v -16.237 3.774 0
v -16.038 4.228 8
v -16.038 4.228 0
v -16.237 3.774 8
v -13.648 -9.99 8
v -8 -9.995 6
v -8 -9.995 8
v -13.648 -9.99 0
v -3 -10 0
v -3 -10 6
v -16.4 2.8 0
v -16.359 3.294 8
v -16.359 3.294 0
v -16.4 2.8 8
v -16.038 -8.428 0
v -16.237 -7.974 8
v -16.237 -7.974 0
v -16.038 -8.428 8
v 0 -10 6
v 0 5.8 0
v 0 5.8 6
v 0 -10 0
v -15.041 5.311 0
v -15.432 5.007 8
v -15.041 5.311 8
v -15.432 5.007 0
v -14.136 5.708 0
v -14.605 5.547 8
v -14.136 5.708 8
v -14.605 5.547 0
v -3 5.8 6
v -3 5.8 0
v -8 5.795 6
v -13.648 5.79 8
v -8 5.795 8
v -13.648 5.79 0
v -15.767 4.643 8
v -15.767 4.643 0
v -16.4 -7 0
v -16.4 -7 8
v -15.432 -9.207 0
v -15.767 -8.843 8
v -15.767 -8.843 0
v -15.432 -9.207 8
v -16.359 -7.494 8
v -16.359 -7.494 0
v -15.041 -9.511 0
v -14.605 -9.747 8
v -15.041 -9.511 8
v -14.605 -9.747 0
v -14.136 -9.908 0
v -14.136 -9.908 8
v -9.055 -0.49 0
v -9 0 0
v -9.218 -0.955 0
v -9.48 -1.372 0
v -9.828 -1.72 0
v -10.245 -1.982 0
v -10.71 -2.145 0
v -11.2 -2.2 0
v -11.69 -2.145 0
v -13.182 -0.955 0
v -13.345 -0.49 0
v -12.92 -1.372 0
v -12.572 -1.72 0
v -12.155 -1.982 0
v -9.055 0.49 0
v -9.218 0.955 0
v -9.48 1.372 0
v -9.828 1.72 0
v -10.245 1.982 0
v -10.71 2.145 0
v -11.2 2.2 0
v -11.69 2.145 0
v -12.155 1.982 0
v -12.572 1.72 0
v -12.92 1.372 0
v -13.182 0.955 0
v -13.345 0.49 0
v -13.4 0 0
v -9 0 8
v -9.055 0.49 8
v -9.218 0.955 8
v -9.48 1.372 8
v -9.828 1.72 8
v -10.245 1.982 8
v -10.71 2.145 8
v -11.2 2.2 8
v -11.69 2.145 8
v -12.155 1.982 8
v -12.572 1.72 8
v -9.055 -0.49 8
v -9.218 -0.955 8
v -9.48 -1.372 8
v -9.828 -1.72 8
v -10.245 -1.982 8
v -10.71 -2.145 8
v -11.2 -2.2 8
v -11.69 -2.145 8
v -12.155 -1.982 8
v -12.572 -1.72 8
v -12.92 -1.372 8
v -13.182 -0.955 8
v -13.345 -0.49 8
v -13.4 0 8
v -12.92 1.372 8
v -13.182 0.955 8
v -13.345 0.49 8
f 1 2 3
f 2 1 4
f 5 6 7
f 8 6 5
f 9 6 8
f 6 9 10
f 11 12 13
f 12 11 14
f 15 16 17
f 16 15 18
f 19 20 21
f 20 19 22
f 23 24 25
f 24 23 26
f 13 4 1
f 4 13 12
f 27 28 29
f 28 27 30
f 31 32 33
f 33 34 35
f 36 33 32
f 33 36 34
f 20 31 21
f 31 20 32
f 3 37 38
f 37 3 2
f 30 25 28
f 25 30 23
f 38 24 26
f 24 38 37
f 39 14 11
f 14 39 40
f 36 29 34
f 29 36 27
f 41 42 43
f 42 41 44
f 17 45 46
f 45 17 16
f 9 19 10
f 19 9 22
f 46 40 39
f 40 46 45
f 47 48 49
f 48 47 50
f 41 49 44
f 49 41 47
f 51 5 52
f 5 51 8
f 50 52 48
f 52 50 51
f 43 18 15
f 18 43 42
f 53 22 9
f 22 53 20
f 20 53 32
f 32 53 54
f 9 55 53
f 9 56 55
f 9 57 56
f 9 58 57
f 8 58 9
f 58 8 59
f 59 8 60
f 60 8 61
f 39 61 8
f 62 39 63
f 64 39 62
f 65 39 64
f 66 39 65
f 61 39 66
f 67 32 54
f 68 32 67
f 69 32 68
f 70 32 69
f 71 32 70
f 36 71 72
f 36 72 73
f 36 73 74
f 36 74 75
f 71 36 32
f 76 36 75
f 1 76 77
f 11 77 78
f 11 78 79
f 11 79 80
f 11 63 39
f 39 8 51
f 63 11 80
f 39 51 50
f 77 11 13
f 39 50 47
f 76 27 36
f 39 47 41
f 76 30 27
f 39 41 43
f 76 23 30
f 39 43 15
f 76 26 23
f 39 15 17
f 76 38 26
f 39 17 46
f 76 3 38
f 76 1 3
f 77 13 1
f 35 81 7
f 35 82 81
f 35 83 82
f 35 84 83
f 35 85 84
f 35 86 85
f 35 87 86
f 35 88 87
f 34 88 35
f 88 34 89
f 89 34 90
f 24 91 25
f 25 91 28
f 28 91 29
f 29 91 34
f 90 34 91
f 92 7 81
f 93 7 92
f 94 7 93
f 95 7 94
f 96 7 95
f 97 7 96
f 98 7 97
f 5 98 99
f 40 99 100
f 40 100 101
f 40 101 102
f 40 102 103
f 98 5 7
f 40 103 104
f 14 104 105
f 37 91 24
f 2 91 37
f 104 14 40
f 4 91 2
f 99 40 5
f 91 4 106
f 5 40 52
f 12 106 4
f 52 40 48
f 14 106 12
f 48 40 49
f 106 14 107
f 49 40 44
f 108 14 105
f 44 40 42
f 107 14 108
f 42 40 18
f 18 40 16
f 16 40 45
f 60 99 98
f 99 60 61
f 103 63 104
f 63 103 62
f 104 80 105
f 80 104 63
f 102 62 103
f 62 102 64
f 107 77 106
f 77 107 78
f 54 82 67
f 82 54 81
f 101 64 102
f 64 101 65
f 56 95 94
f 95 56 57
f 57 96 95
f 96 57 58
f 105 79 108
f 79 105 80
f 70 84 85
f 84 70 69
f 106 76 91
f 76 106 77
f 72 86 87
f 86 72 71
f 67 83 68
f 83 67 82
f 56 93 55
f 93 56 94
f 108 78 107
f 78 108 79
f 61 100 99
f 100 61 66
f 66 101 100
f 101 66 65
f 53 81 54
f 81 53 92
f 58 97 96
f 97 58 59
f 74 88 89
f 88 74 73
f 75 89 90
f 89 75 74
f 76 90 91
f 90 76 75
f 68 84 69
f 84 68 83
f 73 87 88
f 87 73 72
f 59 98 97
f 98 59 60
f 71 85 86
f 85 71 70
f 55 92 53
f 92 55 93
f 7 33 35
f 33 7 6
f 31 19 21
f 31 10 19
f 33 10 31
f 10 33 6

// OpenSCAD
// file: functions.scad
/*******************************************************************

This OpenSCAD code and its rendered 3D model are part of the

	Kühling&Kühling RepRap Industrial 3D Printer


All details, BOM, assembling instructions and latest sources:
	http://kuehlingkuehling.de

Designed and developed by:
	Jonas Kühling <mail@jonaskuehling.de>
	Simon Kühling <mail@simonkuehling.de>

Licensed under:
	Creative Commons Attribution-ShareAlike
	CC BY-SA 3.0
	http://creativecommons.org/licenses/by-sa/3.0/

*******************************************************************/

module teardrop (r=4.5,h=20,alpha=45,teardropcorner=0,fulldrop=0){		// tear drop hole for top-centering
											// use teardropcorner=1 for bottom horizontal corners
	render()
	translate([-h/2,0,0])
		rotate([-270,0+(teardropcorner*180),90])
			difference(){
				linear_extrude(height=h){
					circle(r);
					polygon(points=[[0,0],[r*cos(alpha),r*sin(alpha)],[0,r/sin(alpha)],[-r*cos(alpha),r*sin(alpha)]], paths=[[0,1,2,3]]);
				}
				if(fulldrop==0) 
					translate([0,(r/sin(alpha))/2+r,h/2]) cube([2*r+2,r/sin(alpha),h+2],center=true);
			}
}

//teardrop(4.5,22,fulldrop=true);



module teardropcentering (r=4.5,h=20,alpha=45){				// tear drop hole for top-centering
	centering_offset_factor = 1.1;
	render()
	translate([-h/2,0,0])
		rotate([-270,0,90])
			difference(){
				linear_extrude(height=h){
					circle(r, $fn=24);
					polygon(points=[[0,0],[r*cos(alpha),r*sin(alpha)],[0,r/sin(alpha)],[-r*cos(alpha),r*sin(alpha)]], paths=[[0,1,2,3]]);
				}
				translate([0,(r/sin(alpha))/2+r*centering_offset_factor,h/2]) cube([2*r+2,r/sin(alpha),h+2],center=true);
			}
}

//teardropcentering();



module teardropcentering_half (r=4.5,h=20, bottom=0,alpha=45){				// tear drop hole for top-centering
																// upper half (bottom=0) or bottom half (bottom=1)
	centering_offset_factor = 1.2;
	render()
	translate([-h/2,0,0])
		rotate([-270,0,90])
			difference(){
				linear_extrude(height=h){
					circle(r, $fn=24);
					polygon(points=[[0,0],[r*cos(alpha),r*sin(alpha)],[0,r/sin(alpha)],[-r*cos(alpha),r*sin(alpha)]], paths=[[0,1,2,3]]);
				}
				translate([0,(r/sin(alpha))/2+r*centering_offset_factor,h/2]) cube([2*r+2,r/sin(alpha),h+2],center=true);
				translate([0,-(r*centering_offset_factor)/2-0.5+bottom*(r*centering_offset_factor+1),h/2]) cube([2*r+2,r*centering_offset_factor+1,h+2],center=true);
			}
}

//teardropcentering_half(bottom=0);


module polyhole(d,h){
	n = max(round(2 * d),3);
	cylinder(h = h, r = (d / 2) / cos (180 / n), $fn = n, center=true);
}



module roundcorner(radius,edge_length){
	render()
	translate([0,0,-1])
		difference(){
			translate([-1,-1,0])
				cube(size = [radius+1,radius+1,edge_length+2], center = false);
			translate(v = [radius,radius,-1])
				cylinder(h = edge_length+4, r=radius, center=false,$fs=0.1);
		}
}

//roundcorner(5,5);



module roundcorner_tear(radius,edge_length){
	render()
	difference(){
		translate([-1,-1,-1])
			cube(size = [edge_length+2, radius+1, radius+1], center = false);
		translate([(edge_length+4)/2-2, radius, radius])
			teardrop(radius, edge_length+4,teardropcorner=1);
	}
}

//roundcorner_tear(8,20);


module roundedge_tear(radius){
	render()
	difference(){
		translate([-1,-1,-1])
			cube(size = [radius+1, radius+1, radius+1], center = false);
		translate([radius,radius,radius])
			union(){
				sphere(r=radius, $fs=0.1);
				translate([0,0,-radius])
					cylinder(r1=(radius*sin(45))-(radius-(radius*sin(45))),r2=radius*sin(45),h=(radius-(radius*sin(45))), $fs=0.1);
			}
	}
}

//roundedge_tear(20);



module roundedge(radius){
	render()
	difference(){
		translate([-1,-1,-1])
			cube(size = [radius+1, radius+1, radius+1], center = false);
		translate([radius,radius,radius])
			sphere(r=radius, $fs=0.1);
	}
}

//roundedge(5);


module nut_trap(nut_wrench_size,trap_height,vertical=0, clearance=0.2,center=true){		// M3 wrench size = 5.5
	radius = cornerdiameter(nut_wrench_size+2*clearance) /2;
	rotate([0,vertical*90,0])
		cylinder(h = trap_height, r = radius, center=center, $fn = 6);
}

//nut_trap(5,5,0);

module nut_slot(nut_wrench_size,nut_height, nut_elevation,vertical=0, clearance=0.2){		// M3 wrench size = 5.5
	radius = cornerdiameter(nut_wrench_size+2*clearance) /2;
	slot_height = nut_height+2*clearance;
	slot_width = nut_wrench_size+2*clearance;
	rotate([0,vertical*270,0]){
		cylinder(h = slot_height, r = radius, center=true, $fn = 6);
		translate([0,-slot_width/2,-slot_height/2]) cube([nut_elevation+1,slot_width,slot_height]);
	}
}

//nut_slot(5.5,3,4,1);

function cornerdiameter(wrench_size) =  2* ((wrench_size)/2)/ cos(180/6);
function cornerdiameter_8(wrench_size) =  2* ((wrench_size)/2)/ cos(180/8);
// main file
/*******************************************************************

This OpenSCAD code and its rendered 3D model are part of the

	Kühling&Kühling RepRap Industrial 3D Printer


All details, BOM, assembling instructions and latest sources:
	http://kuehlingkuehling.de

Designed and developed by:
	Jonas Kühling <mail@jonaskuehling.de>
	Simon Kühling <mail@simonkuehling.de>

Licensed under:
	Creative Commons Attribution-ShareAlike
	CC BY-SA 3.0
	http://creativecommons.org/licenses/by-sa/3.0/

*******************************************************************/

include <configuration.scad>

cablechain_rail_profile_side_long = 15;			// aluminium L-profile
cablechain_rail_profile_side_short = 10;			// aluminium L-profile
cablechain_rail_profile_thickness = 2;			// aluminium L-profile


// RENDER FOR PRINTING
mirror([0,1,0])
translate([0,0,cablechain_rail_profile_thickness+2*wall]) rotate([0,180,0]) cabelchain_rail_mount();


module cabelchain_rail_mount(){
	difference(){

		// main body
		hull(){
			translate([0,-frame_width/2+frame_enclosure_thickness+clearance,0])
				cube([wall,frame_width-frame_enclosure_thickness-clearance,cablechain_rail_profile_thickness+2*wall]);
			translate([cablechain_rail_profile_side_short-cablechain_rail_profile_thickness+wall_thin+2*clearance+frame_screw_dia+wall-wall,-frame_width/2+frame_enclosure_thickness+clearance+wall,0])
				cylinder(r=wall,h=cablechain_rail_profile_thickness+2*wall);
			translate([cablechain_rail_profile_side_short-cablechain_rail_profile_thickness+wall_thin+2*clearance+frame_screw_dia+wall-wall,frame_width/2-wall,0])
				cylinder(r=wall,h=cablechain_rail_profile_thickness+2*wall);
		}

		// frame mount screw hole
		translate([cablechain_rail_profile_side_short-cablechain_rail_profile_thickness+wall_thin+clearance+frame_screw_dia/2,0,-1])
			cylinder(r=frame_screw_dia/2+clearance,h=cablechain_rail_profile_thickness+2*wall+2);

		// cablechain rail profile clearance
		translate([-1,-frame_width/2-1,-1])
			cube([cablechain_rail_profile_side_short-cablechain_rail_profile_thickness+1,frame_width+2,cablechain_rail_profile_thickness+1]);
		
	}
}
